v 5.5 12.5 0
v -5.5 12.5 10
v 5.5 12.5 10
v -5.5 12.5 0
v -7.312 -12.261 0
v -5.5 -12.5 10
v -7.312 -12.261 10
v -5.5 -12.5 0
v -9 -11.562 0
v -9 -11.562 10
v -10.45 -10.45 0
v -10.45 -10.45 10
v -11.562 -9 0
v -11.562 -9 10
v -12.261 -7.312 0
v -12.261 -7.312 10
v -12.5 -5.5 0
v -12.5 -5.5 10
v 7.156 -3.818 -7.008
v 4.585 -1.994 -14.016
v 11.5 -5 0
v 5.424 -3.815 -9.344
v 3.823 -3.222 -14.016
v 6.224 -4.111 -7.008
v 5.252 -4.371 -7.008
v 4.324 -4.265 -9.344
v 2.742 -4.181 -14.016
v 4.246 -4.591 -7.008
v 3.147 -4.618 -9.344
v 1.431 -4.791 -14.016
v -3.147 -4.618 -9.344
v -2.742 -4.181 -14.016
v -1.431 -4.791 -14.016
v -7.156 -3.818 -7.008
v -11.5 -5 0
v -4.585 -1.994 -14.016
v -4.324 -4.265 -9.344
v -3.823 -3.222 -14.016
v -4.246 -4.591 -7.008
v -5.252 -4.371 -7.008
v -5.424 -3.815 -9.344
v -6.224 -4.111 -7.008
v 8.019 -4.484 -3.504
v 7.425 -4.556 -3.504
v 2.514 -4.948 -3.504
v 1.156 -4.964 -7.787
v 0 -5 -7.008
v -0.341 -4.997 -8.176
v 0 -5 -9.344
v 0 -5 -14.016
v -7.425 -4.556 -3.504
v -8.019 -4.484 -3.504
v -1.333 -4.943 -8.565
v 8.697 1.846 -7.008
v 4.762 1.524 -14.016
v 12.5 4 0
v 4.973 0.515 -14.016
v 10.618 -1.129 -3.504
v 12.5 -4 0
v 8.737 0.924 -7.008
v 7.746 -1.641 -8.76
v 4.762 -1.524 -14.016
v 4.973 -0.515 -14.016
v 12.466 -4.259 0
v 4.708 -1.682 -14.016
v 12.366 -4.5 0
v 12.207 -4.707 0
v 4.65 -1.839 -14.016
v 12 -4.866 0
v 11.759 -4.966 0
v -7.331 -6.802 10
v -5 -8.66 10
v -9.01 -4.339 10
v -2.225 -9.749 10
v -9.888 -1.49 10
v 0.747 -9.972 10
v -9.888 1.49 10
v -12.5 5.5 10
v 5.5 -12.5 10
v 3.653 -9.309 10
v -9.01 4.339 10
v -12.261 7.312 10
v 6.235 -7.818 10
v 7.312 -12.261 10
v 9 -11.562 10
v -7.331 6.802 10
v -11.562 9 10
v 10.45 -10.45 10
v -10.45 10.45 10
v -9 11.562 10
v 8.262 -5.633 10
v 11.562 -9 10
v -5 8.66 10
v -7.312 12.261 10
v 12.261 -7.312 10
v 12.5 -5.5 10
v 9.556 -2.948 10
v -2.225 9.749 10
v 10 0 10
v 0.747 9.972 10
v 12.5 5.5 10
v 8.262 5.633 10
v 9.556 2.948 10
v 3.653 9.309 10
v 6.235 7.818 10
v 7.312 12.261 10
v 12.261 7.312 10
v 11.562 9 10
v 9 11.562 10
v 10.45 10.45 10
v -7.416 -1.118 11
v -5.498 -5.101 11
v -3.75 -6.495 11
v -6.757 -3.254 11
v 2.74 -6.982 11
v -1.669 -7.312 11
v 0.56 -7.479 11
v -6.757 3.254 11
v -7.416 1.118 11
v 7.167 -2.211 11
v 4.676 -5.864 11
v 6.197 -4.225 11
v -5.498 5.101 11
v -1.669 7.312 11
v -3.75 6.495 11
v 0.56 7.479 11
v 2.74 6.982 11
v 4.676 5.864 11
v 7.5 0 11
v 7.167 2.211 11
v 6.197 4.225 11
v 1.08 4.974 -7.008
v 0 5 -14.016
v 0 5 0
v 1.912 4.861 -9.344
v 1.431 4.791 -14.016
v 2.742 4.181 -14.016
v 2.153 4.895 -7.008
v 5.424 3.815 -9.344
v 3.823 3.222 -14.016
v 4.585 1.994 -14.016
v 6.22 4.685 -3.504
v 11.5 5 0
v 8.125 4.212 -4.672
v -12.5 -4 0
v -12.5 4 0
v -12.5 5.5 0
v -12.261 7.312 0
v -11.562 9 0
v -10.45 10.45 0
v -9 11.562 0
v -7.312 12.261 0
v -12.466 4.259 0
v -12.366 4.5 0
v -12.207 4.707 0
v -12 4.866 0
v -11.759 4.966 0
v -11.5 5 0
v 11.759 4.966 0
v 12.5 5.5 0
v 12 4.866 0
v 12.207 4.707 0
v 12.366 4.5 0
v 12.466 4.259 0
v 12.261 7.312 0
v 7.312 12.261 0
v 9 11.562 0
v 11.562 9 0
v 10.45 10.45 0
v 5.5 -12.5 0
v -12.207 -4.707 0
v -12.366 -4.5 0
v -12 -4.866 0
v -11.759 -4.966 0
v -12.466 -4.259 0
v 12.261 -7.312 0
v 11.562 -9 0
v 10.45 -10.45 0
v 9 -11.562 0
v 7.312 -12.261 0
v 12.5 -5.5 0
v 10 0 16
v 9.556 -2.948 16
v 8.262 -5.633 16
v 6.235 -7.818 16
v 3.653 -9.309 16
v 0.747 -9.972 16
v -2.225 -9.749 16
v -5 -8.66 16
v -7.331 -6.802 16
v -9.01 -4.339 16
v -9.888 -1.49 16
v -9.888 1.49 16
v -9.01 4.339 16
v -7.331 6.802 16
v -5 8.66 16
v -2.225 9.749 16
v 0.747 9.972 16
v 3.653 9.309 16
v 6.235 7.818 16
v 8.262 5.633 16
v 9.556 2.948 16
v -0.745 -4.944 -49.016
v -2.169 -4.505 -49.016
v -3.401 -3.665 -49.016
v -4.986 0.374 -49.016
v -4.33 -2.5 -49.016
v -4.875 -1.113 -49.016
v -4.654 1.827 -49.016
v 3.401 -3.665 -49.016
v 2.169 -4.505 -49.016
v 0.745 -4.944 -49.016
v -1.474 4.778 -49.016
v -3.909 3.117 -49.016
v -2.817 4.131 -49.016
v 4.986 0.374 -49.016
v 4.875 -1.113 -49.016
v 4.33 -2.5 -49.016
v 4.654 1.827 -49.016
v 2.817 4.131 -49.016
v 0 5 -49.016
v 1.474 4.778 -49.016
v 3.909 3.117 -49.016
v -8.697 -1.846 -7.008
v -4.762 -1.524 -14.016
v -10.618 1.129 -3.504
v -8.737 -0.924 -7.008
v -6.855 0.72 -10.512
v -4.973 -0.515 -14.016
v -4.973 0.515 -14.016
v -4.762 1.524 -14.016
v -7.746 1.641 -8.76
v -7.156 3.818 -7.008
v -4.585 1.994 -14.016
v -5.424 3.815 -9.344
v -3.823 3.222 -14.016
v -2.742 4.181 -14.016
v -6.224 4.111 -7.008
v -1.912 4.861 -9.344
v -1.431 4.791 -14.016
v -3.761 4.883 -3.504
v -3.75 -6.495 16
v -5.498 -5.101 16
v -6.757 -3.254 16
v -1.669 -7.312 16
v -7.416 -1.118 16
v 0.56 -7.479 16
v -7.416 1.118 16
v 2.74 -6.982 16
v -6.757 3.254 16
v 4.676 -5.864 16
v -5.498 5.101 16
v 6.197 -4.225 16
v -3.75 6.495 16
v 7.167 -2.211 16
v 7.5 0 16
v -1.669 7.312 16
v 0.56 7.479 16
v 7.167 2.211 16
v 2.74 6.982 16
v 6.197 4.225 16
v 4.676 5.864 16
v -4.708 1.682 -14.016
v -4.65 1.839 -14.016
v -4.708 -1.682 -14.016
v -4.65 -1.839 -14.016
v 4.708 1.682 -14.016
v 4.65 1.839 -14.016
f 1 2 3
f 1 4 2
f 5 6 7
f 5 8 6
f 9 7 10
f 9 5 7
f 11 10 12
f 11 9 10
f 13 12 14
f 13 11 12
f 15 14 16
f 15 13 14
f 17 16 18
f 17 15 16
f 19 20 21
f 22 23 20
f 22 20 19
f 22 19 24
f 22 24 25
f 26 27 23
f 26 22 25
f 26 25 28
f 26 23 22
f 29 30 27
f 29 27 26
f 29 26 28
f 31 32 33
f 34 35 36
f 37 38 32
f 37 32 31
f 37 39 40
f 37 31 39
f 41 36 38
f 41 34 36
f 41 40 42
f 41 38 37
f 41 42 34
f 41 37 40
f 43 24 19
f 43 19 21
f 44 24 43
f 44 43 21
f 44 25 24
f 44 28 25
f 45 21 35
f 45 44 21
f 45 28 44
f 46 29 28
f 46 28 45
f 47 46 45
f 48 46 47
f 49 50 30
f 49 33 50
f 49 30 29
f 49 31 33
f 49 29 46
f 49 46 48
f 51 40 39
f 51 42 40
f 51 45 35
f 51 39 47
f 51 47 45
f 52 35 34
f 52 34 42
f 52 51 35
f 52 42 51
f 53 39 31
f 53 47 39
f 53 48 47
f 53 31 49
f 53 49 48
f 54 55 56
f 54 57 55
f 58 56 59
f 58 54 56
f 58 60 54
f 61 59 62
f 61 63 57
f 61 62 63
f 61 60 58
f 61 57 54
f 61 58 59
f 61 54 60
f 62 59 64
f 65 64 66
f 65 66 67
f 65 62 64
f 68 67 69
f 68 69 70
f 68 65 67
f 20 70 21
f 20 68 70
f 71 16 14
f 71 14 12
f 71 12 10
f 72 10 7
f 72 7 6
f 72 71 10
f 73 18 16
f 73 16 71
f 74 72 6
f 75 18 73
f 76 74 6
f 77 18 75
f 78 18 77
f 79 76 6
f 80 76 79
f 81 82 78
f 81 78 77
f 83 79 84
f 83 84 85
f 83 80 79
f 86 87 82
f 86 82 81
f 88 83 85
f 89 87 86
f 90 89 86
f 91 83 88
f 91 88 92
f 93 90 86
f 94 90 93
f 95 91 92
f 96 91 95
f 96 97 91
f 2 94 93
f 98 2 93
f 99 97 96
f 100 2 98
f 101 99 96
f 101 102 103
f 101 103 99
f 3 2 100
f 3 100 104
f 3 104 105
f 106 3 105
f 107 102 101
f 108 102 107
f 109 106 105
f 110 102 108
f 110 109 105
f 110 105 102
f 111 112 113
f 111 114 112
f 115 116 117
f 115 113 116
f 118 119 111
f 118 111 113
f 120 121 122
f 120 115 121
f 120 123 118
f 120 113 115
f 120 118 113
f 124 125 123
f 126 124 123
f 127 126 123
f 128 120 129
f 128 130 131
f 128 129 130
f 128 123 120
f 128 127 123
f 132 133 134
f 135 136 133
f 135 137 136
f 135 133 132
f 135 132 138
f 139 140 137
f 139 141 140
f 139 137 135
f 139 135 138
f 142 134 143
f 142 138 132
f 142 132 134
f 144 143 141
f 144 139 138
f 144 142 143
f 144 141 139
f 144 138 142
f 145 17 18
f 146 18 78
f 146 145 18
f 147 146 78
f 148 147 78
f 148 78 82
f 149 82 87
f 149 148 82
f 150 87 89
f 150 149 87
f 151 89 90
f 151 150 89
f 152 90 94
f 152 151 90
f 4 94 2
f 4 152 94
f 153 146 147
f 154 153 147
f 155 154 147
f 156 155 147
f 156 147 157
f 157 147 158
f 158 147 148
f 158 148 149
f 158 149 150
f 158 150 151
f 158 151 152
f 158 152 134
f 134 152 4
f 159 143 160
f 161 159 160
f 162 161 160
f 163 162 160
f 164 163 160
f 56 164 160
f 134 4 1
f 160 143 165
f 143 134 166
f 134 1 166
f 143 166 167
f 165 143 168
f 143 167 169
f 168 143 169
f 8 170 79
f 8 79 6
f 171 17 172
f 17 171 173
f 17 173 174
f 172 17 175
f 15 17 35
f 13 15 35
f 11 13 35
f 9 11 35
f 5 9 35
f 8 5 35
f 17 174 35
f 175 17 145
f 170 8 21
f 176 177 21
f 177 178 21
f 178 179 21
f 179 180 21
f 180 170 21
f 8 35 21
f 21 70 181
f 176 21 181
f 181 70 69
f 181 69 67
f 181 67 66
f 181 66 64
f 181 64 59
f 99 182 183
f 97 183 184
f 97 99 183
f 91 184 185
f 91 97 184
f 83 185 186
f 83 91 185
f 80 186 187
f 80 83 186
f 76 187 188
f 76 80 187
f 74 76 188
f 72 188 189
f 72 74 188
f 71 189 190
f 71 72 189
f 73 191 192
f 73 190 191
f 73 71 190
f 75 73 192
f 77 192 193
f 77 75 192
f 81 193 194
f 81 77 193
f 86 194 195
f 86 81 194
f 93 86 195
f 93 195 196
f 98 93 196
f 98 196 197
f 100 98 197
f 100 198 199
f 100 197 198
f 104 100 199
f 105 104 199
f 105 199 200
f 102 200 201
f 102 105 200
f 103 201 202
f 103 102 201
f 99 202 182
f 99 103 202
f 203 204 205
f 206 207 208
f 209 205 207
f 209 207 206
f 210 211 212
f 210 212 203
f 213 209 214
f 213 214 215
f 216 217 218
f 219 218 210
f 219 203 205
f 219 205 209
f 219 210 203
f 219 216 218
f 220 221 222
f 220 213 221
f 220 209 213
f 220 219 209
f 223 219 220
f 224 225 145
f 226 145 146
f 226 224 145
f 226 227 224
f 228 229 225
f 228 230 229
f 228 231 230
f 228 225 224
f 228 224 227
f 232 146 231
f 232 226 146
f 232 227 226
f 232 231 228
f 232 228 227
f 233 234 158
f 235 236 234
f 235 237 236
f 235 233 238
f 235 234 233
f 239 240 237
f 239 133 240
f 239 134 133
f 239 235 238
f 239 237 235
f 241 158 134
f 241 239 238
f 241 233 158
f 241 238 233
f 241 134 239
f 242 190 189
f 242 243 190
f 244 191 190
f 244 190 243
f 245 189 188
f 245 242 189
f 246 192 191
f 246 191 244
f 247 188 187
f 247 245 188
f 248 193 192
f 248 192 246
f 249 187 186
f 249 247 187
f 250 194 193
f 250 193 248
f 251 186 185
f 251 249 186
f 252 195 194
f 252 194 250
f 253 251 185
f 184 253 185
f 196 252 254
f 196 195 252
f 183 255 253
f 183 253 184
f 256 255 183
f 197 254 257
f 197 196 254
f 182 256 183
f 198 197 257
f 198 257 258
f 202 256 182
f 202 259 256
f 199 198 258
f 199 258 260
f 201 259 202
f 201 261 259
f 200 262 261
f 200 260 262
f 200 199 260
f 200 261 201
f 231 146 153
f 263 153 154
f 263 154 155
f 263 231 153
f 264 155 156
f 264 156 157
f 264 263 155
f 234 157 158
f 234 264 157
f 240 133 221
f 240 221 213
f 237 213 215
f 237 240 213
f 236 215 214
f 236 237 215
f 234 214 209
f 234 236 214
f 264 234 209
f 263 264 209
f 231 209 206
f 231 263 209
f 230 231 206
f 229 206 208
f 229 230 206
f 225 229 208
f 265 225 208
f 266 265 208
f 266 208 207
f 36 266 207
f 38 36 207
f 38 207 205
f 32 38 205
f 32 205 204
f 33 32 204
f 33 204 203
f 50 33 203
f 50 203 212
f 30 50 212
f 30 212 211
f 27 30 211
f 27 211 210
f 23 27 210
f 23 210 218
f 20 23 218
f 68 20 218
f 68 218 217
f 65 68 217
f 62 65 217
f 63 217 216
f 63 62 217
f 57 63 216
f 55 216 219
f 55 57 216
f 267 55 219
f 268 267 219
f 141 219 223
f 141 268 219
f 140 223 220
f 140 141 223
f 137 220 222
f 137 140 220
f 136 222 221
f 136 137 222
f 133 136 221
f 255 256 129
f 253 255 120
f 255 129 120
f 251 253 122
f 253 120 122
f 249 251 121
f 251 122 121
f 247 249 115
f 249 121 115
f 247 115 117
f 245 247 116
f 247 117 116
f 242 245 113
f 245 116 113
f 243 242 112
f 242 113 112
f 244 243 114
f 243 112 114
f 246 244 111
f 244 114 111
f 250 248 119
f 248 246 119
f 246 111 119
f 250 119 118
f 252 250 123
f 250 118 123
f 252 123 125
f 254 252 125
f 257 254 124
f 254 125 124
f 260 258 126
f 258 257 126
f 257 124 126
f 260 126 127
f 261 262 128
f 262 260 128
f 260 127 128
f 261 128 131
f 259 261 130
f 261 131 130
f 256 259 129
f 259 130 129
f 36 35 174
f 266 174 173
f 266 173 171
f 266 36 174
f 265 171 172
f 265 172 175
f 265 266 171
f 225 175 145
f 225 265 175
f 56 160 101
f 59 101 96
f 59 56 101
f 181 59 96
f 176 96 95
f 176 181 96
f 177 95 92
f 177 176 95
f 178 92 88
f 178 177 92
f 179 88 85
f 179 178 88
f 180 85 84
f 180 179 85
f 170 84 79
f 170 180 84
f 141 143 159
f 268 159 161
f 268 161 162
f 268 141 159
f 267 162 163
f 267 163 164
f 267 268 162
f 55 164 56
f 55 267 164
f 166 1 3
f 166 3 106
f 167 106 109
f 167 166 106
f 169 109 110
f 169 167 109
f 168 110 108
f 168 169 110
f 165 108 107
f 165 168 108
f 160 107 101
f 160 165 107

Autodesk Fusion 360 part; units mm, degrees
sketch "Sketch1" plane through (0, 0, 0) normal (0, 0, 1) x (1, 0, 0)
  circle A0 centre (0, 0) radius 7.5
  line L0 (-5.5, 12.5) -> (5.5, 12.5)
  line L1 (12.5, 5.5) -> (12.5, -5.5)
  line L2 (5.5, -12.5) -> (-5.5, -12.5)
  line L3 (-12.5, -5.5) -> (-12.5, 5.5)
  circle A1 centre (0, 0) radius 10
  arc A2 (-5.5, 12.5) -> (-12.5, 5.5) centre (-5.5, 5.5) ccw
  arc A3 (12.5, 5.5) -> (5.5, 12.5) centre (5.5, 5.5) ccw
  arc A4 (5.5, -12.5) -> (12.5, -5.5) centre (5.5, -5.5) ccw
  arc A5 (-12.5, -5.5) -> (-5.5, -12.5) centre (-5.5, -5.5) ccw
  line L4 (-10.4497, 10.4497) -> (10.4497, -10.4497)
  line L5 (10.4497, 10.4497) -> (0, 0)
  point P0 (-12.5, 12.5)
  dimension "d1" = 15
  dimension "d2" = 20
  dimension "d5" = 7
extrude "Extrude1" add sketch "Sketch1" along normal blind 10 contours L1 A1 A3 A4 L4 L5 | L0 A1 A2 A3 L4 L5 | L2 L3 A1 A2 A4 A5 L4 makes body 1
extrude "Extrude2" add sketch "Sketch1" along normal blind 16 contours A0 A1 L4 L5 | A0 A1 L4 L5 | A0 A1 L4 bodies 1
extrude "Extrude3" add sketch "Sketch1" along normal blind 11 contours A0 L4 L5 | A0 L4 L5 | A0 L4 bodies 1
sketch "Sketch2" plane through (0, 0, 0) normal (1, 0, 0) x (0, 0, -1)
  line L0 (14.0161, 0) -> (49.0161, 0)
  line L1 (49.0161, 0) -> (49.0161, 5)
  line L2 (49.0161, 5) -> (14.0161, 5)
  line L3 (14.0161, 5) -> (14.0161, 0)
  dimension "d12" = 35
  dimension "d13" = 5
revolve "Revolve1" add sketch "Sketch2" angle 360 about axis through (0, 0, -14.0161) along (0, 0, -1) separate body makes body 2
sketch "Sketch3" plane through (0, 0, 0) normal (0, 0, -1) x (-1, 0, 0)
  arc A0 (12.5, 5.5) -> (5.5, 12.5) centre (5.5, 5.5) ccw
  line L0 (5.5, 12.5) -> (-5.5, 12.5)
  arc A1 (-5.5, 12.5) -> (-12.5, 5.5) centre (-5.5, 5.5) ccw
  line L1 (-12.5, 5.5) -> (-12.5, -5.5)
  arc A2 (-12.5, -5.5) -> (-5.5, -12.5) centre (-5.5, -5.5) ccw
  line L2 (-5.5, -12.5) -> (5.5, -12.5)
  arc A3 (5.5, -12.5) -> (12.5, -5.5) centre (5.5, -5.5) ccw
  line L3 (12.5, -5.5) -> (12.5, 5.5)
  line L4 (-11.5, 5) -> (11.5, 5)
  line L5 (11.5, -5) -> (-11.5, -5)
  line L6 (-12.5, -4) -> (-12.5, 4)
  arc A4 (-11.5, 5) -> (-12.5, 4) centre (-11.5, 4) ccw
  arc A5 (-12.5, -4) -> (-11.5, -5) centre (-11.5, -4) ccw
  line L7 (-12.5, 0) -> (17.5, 0) construction
  line L8 (12.5, 4) -> (12.5, -4)
  arc A6 (12.5, 4) -> (11.5, 5) centre (11.5, 4) ccw
  arc A7 (11.5, -5) -> (12.5, -4) centre (11.5, -4) ccw
  point P0 (-12.5, 5)
  point P1 (-12.5, -5)
  dimension "d15" = 10
  dimension "d16" = 1
  dimension "d17" = 1
loft "Loft1" add profiles "Sketch3" section 1 contours L1 L3 L4 L5 L6 A4 A5 L8 A6 A7 section 2 face at (-1.5459, -1.0946, -14.0161) on bodies 2 bodies 2 1
